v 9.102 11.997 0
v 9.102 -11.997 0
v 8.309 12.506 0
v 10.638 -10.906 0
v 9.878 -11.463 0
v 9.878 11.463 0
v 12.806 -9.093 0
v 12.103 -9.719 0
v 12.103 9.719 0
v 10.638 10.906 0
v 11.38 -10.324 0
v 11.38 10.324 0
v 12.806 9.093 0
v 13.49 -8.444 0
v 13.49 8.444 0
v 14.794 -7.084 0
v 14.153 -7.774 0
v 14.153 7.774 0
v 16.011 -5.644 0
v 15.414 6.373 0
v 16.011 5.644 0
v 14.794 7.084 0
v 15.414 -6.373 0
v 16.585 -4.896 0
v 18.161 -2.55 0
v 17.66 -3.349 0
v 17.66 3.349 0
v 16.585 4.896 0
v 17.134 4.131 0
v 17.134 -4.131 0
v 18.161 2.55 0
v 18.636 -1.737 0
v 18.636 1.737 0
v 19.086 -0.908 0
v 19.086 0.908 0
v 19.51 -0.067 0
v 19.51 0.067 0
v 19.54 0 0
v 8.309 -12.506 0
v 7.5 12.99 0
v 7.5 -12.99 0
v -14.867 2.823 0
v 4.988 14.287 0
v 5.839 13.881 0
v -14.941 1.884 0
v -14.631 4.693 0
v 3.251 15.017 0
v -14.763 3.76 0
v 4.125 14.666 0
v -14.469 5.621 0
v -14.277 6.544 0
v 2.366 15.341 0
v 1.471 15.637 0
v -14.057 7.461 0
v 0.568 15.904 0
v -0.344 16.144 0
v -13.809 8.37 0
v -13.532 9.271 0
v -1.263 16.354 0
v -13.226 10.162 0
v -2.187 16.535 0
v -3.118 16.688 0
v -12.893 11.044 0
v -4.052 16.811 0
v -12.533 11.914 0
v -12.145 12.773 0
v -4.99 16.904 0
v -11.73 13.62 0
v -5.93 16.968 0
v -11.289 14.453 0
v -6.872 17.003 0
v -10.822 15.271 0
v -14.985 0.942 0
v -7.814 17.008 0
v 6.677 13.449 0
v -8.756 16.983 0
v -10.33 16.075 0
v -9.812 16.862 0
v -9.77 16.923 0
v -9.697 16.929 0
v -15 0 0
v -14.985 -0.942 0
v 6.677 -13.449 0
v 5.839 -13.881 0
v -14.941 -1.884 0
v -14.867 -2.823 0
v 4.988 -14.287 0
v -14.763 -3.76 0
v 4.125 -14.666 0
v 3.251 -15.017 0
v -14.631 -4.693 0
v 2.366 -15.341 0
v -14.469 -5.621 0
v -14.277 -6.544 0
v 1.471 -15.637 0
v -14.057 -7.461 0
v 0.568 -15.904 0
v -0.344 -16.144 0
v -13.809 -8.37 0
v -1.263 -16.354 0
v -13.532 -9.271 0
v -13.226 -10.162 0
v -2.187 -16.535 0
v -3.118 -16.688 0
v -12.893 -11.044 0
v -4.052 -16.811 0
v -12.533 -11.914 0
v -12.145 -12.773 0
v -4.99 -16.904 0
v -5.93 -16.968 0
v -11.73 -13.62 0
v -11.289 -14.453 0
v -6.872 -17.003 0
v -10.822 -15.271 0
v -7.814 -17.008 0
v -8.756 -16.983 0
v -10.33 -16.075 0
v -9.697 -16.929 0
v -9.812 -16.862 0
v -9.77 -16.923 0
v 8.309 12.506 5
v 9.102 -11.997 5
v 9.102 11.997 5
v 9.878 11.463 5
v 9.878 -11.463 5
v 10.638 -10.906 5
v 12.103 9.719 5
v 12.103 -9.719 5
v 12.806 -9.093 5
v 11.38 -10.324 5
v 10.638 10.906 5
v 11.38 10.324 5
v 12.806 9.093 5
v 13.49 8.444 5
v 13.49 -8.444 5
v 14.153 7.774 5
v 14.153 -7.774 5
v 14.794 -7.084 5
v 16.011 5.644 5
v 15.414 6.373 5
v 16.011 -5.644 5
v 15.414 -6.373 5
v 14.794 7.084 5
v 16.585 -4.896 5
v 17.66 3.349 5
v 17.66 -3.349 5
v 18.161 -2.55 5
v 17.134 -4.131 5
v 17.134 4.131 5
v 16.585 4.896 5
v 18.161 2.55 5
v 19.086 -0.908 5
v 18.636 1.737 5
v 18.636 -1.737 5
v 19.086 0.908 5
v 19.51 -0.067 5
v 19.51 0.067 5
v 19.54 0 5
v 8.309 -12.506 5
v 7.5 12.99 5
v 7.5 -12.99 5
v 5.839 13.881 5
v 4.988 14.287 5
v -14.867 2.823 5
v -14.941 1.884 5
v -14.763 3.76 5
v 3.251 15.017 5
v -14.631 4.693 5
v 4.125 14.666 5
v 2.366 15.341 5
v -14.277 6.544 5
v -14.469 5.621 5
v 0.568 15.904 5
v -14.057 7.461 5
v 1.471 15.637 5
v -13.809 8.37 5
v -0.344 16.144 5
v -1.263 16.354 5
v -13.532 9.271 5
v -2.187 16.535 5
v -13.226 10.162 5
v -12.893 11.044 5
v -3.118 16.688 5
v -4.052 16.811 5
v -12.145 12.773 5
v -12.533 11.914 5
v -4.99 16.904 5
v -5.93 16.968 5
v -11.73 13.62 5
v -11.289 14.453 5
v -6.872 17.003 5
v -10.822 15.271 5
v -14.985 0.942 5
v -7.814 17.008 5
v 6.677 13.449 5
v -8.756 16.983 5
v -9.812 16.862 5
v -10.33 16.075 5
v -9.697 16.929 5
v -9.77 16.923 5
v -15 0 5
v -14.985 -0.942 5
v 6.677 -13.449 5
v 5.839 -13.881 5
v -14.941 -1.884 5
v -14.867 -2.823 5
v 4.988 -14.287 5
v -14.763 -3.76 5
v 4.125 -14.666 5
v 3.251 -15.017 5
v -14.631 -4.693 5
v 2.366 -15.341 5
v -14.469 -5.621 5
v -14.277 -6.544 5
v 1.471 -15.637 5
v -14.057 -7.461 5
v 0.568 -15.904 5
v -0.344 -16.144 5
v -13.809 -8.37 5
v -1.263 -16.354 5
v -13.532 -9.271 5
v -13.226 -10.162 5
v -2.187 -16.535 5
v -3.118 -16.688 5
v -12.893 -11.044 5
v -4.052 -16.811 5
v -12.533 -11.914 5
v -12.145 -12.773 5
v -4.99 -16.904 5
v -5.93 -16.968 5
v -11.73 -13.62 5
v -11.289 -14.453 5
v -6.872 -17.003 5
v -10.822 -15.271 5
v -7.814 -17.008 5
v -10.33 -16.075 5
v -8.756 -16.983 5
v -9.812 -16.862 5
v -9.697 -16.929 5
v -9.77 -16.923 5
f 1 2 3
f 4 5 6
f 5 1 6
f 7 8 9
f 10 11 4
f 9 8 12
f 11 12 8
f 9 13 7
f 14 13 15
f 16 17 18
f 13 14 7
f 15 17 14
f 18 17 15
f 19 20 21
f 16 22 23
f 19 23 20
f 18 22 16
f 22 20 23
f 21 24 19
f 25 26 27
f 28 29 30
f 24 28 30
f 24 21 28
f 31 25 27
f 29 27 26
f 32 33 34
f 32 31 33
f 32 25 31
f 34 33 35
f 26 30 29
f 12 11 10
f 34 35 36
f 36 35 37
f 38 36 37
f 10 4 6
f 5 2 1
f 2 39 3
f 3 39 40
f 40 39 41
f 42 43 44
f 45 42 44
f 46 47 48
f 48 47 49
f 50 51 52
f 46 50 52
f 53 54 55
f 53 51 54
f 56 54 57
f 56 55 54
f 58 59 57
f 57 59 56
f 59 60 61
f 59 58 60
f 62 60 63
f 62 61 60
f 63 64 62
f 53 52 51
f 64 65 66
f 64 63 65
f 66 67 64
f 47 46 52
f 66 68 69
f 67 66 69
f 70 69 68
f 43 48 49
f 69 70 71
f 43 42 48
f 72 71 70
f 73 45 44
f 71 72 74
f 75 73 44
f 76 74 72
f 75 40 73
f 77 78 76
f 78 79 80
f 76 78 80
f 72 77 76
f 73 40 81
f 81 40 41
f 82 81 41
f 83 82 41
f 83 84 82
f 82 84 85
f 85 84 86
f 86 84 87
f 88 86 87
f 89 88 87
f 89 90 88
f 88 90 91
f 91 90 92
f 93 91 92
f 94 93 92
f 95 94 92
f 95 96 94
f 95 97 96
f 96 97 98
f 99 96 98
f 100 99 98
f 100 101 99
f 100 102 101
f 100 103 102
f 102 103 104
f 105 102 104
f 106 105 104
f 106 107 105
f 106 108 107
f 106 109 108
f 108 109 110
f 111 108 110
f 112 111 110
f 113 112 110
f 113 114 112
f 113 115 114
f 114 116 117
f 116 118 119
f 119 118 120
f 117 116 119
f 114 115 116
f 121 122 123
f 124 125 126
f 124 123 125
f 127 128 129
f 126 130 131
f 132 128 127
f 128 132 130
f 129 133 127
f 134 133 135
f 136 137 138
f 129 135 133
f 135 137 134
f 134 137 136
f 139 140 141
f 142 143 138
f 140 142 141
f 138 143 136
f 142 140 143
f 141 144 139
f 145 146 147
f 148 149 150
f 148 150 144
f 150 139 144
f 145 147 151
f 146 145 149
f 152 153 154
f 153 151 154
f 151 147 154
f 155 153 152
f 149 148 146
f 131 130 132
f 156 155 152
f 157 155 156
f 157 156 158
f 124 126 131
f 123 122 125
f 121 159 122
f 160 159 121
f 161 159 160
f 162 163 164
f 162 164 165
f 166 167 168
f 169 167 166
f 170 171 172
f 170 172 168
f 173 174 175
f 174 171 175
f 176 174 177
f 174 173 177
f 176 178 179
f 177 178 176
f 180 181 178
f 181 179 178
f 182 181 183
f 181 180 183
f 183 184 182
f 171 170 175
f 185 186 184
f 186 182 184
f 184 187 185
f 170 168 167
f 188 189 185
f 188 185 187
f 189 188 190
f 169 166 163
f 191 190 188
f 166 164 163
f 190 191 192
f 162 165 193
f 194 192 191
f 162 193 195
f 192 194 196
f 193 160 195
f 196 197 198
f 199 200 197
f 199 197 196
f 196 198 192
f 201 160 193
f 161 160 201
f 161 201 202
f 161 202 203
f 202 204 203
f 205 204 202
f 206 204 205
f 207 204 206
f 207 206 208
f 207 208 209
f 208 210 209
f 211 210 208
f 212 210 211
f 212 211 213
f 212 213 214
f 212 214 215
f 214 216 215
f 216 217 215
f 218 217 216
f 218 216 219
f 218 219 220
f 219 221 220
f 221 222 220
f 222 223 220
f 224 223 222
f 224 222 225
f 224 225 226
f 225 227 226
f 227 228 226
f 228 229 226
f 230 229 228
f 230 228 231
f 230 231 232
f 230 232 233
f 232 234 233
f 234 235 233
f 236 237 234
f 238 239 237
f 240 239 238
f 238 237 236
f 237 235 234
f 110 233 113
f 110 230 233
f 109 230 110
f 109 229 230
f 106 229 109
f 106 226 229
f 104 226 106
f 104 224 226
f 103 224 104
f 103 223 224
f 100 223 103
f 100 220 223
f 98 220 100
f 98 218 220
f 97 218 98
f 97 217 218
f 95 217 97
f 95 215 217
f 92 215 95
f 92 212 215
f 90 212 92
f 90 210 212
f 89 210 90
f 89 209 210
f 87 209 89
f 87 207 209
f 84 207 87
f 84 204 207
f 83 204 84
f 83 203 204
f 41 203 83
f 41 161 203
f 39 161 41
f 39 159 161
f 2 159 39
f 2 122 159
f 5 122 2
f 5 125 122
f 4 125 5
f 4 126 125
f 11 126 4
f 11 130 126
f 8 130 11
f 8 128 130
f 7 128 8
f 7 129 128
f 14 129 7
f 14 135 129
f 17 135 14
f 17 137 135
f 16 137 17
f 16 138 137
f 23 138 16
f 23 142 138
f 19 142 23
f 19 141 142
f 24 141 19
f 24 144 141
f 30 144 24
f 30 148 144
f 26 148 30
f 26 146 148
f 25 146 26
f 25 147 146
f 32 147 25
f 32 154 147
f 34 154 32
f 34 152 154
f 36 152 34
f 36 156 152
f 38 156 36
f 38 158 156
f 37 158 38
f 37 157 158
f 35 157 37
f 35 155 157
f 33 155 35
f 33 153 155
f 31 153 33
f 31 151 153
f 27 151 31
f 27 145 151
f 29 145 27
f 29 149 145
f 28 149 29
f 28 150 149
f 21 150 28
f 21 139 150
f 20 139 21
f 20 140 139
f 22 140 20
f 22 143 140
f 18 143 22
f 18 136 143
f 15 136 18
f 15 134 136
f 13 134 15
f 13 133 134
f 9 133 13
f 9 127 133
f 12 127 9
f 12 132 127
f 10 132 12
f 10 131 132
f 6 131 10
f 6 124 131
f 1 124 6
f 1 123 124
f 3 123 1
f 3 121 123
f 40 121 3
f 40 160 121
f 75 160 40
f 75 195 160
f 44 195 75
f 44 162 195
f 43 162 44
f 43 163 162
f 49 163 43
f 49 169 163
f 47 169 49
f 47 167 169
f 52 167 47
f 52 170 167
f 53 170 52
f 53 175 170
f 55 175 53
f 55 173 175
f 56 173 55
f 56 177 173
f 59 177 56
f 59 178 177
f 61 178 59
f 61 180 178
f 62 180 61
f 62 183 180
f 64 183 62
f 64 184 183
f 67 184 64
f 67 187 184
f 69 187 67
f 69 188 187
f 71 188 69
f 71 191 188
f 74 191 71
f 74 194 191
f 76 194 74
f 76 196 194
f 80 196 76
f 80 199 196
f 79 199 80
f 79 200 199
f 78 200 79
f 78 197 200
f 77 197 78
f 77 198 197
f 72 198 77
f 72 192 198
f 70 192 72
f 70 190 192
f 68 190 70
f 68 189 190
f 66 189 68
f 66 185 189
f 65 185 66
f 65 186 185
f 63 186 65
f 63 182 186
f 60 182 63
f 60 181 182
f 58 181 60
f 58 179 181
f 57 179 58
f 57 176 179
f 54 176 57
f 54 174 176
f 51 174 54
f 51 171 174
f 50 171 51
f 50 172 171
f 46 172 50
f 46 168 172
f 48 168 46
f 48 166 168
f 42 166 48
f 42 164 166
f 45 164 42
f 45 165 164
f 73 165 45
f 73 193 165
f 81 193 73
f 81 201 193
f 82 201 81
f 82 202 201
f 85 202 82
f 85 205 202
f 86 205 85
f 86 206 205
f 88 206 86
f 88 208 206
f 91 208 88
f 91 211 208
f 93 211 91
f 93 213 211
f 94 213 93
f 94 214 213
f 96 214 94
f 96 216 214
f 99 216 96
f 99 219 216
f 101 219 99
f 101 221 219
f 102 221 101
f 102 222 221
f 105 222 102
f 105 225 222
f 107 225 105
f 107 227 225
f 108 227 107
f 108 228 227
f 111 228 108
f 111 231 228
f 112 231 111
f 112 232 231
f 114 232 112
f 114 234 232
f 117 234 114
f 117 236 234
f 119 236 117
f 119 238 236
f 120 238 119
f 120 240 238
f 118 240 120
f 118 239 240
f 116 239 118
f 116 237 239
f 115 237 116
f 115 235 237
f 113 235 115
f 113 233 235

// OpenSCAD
// Ammount of sides the object has
s=3; // [3,5,7,9]
// Distance between two verticies (mm) NOTE: Two different sided figures with the same distance between verticies will NOT work together. I will make it work together soon.
r=30; // [1:150]
// Height (mm)
h=5; // [1:30]
linear_extrude(height=h) {
    intersection_for(i = [1:s]) {
        rotate([0,0,i * 360/s]) {
            translate([r/2,0,0]) {
                circle(r, $fn = 200);
            }
        }
    }
}
